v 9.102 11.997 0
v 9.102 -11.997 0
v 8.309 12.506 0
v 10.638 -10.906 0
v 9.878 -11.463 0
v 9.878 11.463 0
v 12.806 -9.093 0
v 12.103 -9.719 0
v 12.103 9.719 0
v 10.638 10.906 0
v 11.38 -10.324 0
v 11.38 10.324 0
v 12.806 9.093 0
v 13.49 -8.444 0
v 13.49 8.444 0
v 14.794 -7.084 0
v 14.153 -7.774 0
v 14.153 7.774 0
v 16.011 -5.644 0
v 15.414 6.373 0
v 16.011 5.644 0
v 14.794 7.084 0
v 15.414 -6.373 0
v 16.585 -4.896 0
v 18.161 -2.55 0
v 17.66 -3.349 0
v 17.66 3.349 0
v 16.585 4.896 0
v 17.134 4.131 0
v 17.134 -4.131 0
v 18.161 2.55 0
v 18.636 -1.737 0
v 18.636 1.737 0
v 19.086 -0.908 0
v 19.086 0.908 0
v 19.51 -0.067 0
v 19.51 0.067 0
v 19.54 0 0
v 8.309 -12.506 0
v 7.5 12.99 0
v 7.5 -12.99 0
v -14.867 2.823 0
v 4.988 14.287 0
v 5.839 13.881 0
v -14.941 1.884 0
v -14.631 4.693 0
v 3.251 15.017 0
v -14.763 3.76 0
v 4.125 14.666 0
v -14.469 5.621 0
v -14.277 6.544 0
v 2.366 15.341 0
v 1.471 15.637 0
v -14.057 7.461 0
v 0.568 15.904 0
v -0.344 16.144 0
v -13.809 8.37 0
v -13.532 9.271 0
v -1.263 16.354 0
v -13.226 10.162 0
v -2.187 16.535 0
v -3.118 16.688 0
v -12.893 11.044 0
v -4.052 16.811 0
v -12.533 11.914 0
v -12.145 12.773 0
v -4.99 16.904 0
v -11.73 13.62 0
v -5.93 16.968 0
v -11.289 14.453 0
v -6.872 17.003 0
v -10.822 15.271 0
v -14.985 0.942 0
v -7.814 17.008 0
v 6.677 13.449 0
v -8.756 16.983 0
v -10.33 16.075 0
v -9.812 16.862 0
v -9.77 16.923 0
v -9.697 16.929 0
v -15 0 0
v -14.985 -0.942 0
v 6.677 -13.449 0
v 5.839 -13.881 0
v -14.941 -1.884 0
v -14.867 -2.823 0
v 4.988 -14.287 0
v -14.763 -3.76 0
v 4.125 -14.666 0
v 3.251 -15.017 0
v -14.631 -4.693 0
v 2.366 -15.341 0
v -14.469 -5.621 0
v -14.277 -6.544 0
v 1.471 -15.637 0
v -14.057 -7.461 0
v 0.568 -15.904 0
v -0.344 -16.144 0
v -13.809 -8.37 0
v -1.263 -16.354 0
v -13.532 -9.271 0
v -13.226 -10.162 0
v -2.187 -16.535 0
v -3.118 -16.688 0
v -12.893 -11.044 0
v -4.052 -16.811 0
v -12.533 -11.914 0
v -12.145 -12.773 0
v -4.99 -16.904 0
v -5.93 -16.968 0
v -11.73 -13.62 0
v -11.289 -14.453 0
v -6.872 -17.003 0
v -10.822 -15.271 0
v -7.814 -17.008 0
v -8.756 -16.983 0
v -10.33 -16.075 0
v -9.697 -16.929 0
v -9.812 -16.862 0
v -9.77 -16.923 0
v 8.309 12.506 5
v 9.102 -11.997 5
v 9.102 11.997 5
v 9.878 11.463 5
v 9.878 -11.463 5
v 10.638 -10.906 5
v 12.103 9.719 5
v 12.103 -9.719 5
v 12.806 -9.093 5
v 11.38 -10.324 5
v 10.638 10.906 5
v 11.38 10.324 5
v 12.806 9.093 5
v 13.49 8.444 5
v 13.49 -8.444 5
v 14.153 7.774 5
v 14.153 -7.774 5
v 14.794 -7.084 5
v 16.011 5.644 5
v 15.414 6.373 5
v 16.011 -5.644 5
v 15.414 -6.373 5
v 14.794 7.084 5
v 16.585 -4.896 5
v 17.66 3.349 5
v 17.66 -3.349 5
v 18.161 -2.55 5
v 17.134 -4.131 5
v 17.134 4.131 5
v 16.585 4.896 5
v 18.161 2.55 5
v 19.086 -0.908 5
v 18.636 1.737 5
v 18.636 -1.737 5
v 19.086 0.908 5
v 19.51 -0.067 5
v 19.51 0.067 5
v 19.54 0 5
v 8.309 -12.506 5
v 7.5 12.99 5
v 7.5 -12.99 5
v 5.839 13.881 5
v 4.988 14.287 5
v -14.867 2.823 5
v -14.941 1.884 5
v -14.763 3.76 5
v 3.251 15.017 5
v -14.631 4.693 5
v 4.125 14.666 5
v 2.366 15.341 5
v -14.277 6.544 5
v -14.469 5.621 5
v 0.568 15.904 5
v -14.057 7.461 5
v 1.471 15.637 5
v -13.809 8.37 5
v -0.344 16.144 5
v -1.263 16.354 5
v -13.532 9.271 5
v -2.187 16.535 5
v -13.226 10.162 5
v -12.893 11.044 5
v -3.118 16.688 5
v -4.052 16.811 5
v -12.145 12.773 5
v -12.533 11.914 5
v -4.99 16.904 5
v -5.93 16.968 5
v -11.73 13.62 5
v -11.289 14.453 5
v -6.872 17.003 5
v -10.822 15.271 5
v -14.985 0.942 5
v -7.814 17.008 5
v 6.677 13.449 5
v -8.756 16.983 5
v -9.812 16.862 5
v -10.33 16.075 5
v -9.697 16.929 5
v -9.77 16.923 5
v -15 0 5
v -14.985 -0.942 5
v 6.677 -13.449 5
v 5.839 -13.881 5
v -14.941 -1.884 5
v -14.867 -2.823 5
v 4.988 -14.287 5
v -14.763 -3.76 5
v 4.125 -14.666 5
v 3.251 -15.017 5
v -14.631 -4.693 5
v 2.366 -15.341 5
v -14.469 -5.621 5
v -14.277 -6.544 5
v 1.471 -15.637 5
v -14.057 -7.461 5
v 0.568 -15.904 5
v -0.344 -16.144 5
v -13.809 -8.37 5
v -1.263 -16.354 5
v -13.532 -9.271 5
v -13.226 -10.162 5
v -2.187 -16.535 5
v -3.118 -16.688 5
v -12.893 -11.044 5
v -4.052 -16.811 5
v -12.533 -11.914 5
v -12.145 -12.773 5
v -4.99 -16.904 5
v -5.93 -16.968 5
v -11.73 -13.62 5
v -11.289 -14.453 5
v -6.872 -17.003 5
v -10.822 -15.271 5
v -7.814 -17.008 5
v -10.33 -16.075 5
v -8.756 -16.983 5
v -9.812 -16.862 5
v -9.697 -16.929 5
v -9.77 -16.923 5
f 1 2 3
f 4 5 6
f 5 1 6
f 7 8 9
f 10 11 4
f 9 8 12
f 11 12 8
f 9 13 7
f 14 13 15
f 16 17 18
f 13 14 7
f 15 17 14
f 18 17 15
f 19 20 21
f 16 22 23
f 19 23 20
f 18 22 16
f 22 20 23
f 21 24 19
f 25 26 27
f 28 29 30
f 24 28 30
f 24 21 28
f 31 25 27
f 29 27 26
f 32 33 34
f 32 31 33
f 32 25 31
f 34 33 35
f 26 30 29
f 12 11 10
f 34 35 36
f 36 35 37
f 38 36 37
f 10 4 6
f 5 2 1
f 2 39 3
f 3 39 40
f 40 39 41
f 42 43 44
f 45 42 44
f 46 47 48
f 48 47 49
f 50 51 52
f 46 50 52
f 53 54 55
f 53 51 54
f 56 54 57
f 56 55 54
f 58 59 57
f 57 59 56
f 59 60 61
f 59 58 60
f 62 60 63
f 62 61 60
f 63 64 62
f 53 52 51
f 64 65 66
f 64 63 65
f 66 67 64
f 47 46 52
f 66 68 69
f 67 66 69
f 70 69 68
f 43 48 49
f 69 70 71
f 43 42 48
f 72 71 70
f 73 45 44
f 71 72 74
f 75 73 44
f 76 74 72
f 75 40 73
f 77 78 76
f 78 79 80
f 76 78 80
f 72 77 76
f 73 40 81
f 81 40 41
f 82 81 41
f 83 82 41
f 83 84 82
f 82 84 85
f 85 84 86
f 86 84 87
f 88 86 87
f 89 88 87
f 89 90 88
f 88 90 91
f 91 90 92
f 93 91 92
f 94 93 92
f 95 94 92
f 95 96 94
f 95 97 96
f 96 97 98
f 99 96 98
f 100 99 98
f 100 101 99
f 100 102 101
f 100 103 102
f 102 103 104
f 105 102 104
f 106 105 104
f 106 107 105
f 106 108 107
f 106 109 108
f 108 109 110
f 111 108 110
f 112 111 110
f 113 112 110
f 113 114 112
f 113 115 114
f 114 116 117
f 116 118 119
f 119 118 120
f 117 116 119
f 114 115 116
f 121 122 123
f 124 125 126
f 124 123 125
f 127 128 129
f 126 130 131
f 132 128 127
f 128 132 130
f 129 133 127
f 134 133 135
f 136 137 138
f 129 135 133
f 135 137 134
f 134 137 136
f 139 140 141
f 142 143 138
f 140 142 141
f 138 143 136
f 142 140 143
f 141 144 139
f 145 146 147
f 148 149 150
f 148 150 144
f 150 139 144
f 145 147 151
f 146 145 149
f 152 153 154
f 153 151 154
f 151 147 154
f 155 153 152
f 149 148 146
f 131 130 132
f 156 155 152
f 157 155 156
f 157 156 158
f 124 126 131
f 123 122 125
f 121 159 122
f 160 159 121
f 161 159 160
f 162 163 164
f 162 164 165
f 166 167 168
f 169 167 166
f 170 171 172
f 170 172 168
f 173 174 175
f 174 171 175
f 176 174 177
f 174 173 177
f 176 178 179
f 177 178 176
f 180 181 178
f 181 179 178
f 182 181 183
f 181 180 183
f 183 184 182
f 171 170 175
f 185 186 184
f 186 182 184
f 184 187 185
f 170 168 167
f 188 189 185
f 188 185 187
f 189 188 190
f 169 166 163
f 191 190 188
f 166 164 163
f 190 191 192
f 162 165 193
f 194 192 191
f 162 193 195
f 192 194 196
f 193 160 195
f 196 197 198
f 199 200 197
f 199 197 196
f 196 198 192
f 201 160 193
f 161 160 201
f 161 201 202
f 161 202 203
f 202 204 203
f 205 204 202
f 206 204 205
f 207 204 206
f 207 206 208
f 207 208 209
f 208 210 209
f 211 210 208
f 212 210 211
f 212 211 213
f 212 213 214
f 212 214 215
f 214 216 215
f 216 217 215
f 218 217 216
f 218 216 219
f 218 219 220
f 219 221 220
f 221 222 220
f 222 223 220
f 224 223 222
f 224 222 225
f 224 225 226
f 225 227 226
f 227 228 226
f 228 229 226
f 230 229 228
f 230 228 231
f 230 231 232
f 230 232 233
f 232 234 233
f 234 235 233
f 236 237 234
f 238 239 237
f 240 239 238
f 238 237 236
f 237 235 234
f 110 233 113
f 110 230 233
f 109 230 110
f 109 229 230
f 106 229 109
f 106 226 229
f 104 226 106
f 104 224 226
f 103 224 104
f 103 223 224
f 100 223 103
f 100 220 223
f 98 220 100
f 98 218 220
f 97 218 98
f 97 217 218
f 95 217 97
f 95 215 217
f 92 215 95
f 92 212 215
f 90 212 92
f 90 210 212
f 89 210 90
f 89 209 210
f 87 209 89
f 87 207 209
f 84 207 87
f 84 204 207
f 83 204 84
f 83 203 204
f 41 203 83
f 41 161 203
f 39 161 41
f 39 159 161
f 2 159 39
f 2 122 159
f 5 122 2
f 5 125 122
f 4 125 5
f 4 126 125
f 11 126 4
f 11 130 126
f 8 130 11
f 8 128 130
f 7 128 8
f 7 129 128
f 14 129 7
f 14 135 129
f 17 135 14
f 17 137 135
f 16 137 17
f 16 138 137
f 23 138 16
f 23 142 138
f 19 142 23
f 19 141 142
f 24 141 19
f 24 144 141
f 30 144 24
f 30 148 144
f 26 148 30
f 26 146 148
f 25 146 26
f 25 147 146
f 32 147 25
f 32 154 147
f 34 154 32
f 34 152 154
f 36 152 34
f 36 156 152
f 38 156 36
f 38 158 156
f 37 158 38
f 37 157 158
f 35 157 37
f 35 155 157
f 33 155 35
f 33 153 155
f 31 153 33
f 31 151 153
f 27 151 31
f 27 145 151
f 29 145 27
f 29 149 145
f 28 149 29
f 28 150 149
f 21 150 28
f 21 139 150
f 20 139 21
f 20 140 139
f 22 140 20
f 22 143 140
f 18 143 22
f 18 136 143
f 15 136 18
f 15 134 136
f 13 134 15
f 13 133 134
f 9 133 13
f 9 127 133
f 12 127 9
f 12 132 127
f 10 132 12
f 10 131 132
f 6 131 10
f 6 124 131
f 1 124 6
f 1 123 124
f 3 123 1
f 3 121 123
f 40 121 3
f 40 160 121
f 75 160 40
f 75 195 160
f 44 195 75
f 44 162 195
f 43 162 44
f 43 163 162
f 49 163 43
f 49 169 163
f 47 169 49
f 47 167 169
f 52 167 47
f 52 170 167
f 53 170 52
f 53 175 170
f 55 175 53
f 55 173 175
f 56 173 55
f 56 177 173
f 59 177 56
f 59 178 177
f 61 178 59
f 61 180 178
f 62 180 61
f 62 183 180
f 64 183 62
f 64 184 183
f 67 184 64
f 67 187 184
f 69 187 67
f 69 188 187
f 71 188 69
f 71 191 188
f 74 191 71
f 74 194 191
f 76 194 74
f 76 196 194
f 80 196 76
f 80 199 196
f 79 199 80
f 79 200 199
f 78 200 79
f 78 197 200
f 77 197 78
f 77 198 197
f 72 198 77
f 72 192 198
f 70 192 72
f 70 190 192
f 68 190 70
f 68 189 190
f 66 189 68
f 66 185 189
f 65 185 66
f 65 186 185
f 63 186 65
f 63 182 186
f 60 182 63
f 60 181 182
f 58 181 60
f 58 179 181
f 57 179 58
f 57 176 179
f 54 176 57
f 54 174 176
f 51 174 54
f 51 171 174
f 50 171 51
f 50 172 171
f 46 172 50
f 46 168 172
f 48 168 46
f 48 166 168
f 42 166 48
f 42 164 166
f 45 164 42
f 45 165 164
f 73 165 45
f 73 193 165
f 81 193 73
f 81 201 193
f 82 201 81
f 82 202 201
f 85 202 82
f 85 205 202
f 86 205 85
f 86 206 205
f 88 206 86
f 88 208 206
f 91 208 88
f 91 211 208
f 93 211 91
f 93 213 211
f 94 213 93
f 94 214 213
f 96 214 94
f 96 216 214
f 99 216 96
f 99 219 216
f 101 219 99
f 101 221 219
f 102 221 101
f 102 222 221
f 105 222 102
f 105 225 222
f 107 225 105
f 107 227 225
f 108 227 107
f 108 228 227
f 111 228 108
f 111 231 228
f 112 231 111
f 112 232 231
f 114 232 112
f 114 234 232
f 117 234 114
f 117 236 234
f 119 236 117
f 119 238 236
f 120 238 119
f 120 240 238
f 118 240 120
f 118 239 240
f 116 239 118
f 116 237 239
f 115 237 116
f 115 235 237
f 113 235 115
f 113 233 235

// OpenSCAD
// Ammount of sides the object has
s=3; // [3,5,7,9]
// Distance between two verticies (mm) NOTE: Two different sided figures with the same distance between verticies will NOT work together. I will make it work together soon.
r=30; // [1:150]
// Height (mm)
h=5; // [1:30]
linear_extrude(height=h) {
    intersection_for(i = [1:s]) {
        rotate([0,0,i * 360/s]) {
            translate([r/2,0,0]) {
                circle(r, $fn = 200);
            }
        }
    }
}
